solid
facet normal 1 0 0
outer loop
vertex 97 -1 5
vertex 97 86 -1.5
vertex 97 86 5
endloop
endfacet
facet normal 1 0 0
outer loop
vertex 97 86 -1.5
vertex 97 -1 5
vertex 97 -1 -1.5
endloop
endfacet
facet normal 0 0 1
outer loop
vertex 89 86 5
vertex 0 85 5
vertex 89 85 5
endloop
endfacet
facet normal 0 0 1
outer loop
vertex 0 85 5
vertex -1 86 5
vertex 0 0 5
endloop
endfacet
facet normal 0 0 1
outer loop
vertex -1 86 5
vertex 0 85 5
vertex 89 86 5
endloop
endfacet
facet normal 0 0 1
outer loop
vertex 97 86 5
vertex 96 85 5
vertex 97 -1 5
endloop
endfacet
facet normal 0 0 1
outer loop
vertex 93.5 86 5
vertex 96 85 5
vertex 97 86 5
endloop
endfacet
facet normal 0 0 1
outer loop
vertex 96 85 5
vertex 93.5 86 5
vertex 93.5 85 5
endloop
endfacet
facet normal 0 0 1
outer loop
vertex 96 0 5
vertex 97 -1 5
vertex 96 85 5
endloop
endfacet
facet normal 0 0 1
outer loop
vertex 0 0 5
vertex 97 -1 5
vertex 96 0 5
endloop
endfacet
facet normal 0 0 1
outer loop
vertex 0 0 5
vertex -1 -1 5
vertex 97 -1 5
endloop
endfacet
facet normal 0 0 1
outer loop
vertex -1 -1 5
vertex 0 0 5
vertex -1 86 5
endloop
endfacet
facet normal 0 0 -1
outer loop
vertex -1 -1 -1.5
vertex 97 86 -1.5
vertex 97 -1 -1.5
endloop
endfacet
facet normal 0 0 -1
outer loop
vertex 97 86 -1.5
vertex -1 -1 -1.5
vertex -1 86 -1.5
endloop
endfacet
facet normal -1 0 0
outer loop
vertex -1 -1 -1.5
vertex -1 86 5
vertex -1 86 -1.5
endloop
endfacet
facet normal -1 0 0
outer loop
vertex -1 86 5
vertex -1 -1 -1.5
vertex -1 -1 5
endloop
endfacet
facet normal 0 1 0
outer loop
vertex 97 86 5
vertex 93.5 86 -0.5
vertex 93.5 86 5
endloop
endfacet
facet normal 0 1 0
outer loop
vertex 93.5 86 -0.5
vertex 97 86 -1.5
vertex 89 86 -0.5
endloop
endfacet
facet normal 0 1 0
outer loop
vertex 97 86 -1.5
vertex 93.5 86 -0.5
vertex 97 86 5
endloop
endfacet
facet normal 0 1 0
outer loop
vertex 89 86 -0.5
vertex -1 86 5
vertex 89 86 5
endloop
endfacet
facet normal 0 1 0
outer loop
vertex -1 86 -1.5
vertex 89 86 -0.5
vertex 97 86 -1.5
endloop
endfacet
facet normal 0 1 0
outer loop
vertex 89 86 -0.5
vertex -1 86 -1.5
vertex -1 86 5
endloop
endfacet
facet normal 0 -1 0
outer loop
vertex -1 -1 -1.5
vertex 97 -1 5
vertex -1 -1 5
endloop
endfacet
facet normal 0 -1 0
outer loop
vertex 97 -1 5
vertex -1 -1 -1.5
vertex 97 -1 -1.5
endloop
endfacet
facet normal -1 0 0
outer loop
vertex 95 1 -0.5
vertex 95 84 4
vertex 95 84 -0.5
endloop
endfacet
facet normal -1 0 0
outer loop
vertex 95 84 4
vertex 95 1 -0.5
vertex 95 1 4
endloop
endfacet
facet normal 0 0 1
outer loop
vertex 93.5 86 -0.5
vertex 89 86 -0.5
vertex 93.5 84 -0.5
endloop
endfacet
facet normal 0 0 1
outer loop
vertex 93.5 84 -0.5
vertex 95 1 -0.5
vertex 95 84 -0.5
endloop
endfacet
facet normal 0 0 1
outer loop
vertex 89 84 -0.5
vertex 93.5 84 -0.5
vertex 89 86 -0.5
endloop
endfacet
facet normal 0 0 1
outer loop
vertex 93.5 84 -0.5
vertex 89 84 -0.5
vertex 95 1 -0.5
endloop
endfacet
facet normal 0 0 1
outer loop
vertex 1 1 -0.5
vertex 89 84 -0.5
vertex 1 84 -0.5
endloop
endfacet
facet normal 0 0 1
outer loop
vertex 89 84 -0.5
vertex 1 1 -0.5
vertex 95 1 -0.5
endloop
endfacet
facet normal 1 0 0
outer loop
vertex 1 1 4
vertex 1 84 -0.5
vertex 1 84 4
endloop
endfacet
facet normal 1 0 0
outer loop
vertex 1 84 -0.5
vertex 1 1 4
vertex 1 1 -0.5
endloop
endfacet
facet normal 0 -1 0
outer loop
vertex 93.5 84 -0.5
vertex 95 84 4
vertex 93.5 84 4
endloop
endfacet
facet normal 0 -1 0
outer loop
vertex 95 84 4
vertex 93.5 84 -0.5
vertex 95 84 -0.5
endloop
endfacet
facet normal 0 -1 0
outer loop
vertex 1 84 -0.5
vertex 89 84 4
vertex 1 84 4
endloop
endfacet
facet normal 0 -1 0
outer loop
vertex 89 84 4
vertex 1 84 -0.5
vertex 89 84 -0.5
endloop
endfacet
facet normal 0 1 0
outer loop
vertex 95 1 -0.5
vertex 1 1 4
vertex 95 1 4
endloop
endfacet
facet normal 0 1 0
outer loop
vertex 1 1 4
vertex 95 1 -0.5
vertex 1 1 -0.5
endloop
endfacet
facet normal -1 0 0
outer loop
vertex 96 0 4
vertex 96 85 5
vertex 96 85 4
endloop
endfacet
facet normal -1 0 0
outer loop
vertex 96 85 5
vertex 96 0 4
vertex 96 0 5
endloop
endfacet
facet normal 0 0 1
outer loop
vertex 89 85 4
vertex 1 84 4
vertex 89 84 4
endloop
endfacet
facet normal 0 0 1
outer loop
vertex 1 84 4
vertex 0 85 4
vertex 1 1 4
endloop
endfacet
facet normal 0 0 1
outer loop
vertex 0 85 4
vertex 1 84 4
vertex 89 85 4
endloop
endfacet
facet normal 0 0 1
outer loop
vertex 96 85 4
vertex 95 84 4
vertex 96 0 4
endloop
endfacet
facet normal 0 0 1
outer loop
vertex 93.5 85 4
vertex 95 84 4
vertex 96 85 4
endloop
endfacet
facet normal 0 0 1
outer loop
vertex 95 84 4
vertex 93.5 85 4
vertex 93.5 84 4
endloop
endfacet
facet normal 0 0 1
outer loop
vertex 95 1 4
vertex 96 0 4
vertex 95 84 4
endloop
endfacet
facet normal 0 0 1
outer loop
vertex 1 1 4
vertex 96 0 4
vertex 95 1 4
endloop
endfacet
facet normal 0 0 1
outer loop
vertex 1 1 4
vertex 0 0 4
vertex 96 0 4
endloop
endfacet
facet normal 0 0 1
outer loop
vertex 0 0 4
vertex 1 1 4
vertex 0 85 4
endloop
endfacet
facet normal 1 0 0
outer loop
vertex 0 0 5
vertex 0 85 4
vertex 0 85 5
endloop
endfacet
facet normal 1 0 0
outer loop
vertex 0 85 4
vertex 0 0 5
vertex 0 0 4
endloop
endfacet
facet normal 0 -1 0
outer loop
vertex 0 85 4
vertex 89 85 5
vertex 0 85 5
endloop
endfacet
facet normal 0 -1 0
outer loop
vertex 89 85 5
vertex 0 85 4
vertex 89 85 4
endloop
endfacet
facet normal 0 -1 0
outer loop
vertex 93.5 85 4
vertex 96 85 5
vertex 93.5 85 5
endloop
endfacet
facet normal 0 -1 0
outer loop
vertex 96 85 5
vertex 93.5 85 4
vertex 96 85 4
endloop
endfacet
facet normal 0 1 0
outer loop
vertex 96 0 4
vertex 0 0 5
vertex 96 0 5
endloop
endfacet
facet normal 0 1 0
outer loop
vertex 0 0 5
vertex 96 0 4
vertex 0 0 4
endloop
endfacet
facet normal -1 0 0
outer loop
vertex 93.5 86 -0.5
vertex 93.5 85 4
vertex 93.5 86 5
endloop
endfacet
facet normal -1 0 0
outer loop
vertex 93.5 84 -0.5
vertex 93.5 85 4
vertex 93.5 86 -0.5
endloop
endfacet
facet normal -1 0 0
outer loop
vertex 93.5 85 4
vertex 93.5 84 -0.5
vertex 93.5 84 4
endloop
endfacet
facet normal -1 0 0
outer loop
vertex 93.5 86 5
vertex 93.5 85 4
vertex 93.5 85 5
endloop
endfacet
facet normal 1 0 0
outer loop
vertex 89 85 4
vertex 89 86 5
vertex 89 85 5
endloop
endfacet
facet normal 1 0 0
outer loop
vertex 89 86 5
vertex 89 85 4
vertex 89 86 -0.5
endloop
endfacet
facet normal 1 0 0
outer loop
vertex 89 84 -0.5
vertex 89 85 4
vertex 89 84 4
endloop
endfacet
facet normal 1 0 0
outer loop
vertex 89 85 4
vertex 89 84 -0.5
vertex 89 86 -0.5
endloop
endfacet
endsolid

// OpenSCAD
// 1cm to 1foot scale model of the IBM Q System One Quantum Computer

// Andy Stanford-Clark
// andysc@uk.ibm.com / @andysc
// Feb '19


// v4.5 is a tidy-up for publication
// v4 is the redesigned glass idea for the base and lid
// v3 adds the deltas for the exploded view



// print list...

// 1. base 
// 2. base_lid 
// 3. back_box  * print with raft *
// 4. top_box * print with 1mm brim *
//    (then trim off all *except* the hole where the diffuser goes, as we need the lip to sit the diffuser on)
// 5. top_box_lid (inverted) 
// 6. lid (inverted)
// 7. lid_lower (inverted)
// 8. lid plinth (inverted for smoothness)

// 9. reflector in white (inverted)
// 10. reflector_strip in white

// 11. diffuser in clear filament (inverted) 

// cryostat needs to be a 25mm x 44mm silver tube (I used chrome-plated wardrobe rail)

// glass walls in 1mm acrylic
// front and back: 92 x 81 mm
// left and right: 85 x 81 mm 

// --------------------------------------------------------------------------------
// these should be the only bits you need to change (down to next dashed line)

// which bits to print?
// set each of these true in turn, and all the others false, to make each component


base = true;
base_lid = false;
back_box = false;
top_box = false;
top_box_lid = false;

// translucent
diffuser = false;

// white
reflector = false;
reflector_strip = false;

lid = false;
lid_lower = false; // the "lid" of the lid, if you like!
lid_plinth = false; // the thin plate on the very very top of the system


// --------------------------------------------------------------------------------
// optional elements for display purposes

cryostat = false; // we're not going to print this - it's just for display

// master control for walls
walls = false;
// selectively remove some of the walls
left_wall=true;
right_wall=false;
front_wall=false;
back_wall=true;


explode = 0; // set to 1 to explode the view, 0 normally

// --------------------------------------


wiring = true; // put in the cut-outs for a micro-USB cable
// how much extra height do we need on the base to allow for the cable?
extra_base = 1.5;


d = 3;
d1 = explode * d;     // base lid
d2 = explode * d*2; // back box
d3 = explode * d*5; // top box
d4 = explode * d*6.2; // lid lower
d5 = explode * d*7; // lid
d6 = explode * d*7.5; // lid plinth
d7 = explode * d*3; // diffuser 
d8 = explode * d*6; // top box lid
d9 = explode * d*2; // walls
d10 = explode * d*2; // cryostat


black = "white"; 
//black = "black";
white = "red";
//white = "white";

// going with a scale of 1cm to 1ft, so as it's 9ft wide, it's 90mm wide
// this is the INSIDE measurement - the flange for the glass is outside this
width = 96; // increased width for full-size pi compatibility
height = 90;
depth = 85;



mink_radius = 3;

// things that fit inside each other (e.g. diffuser inside top box)
// i.e. 0.5 mm total if you allow this each side (i.e. 2*)
tolerance = 0.25;

base_height = 6;
// make the back box a little bit lower just to allow for joint tolerances and stuff
back_box_height = 65 - 1; // this should be 65
back_box_depth = 37;   

top_box_height = 10;
// how far inset is the top box?
inside_gap = 3;

cryostat_height = 43;
cryostat_diameter = 25;

lid_height = 5;
// size of hole for wire in top box
wire_hole = 5;

// how thick to make the internal box walls£
box_walls = 1.0;

// how thick is the half inch thick plate glass?
glass_thickness = 1;

// how thin to make the little outside lip of the base?
edge_delta = 0.5;

// display cutout
display_height = 40; 
display_width = 70;
 
// here we go....  

back_box_width = width - 2*inside_gap;

mount_outer = 2;
mount_outer_base = 5; // wider base of mount for better printablility
mount_inner = 1.1; // 2mm for 3M screws
mount_height = 5;

color(black) {
    
// base
if (base) {
    difference() {
        translate([-glass_thickness, -glass_thickness, -extra_base])
            cube([width + 2*glass_thickness, depth + 2*glass_thickness, 
            base_height-1+extra_base]);
        // hollow out the insides
        translate([1, 1,-extra_base+box_walls])
            cube([width - 2, depth - 2, base_height-box_walls-1+extra_base]);
        // make a lip 1mm down for the lid to rest on
        translate([0, 0, base_height-1-1])
            cube([width, depth, 1]);
        
        // make the hole for the cable to come in
        if (wiring)
            translate([width - 7, depth -1, box_walls-extra_base])
                #cube([4.5,1+glass_thickness,base_height-box_walls-1+extra_base]);
        
    }  
}


// base lid
if (base_lid) {
        difference() {
            union() {
                // lid panel
                translate([0,0,base_height-1-1 + d1])
                    cube([width-2*tolerance, depth-2*tolerance, 2]);
        
                // make a stub for the back box to sit over
                translate([inside_gap+mink_radius, inside_gap + (25+15) + mink_radius, base_height])
                // 1.5 * tolerance cos that's half of 3
                   translate([box_walls+1.5*tolerance, box_walls+1.5*tolerance, 0])
                        difference() {
                            minkowski() {
                                // make it 3*tolerance for a bit of extra wiggle room
                                cube([back_box_width-2*mink_radius - 2*box_walls - 3*tolerance, 
                                    back_box_depth-2*mink_radius - 2*box_walls - 3*tolerance, 
                                    2]);
                                // where '2' is the height of the stub
                                cylinder(r=mink_radius, h=0.0001, $fn=100);
                            }
                            // hollow out the inside
                            translate([box_walls, box_walls, 0])
                                minkowski() {
                                    cube([back_box_width-2*mink_radius - 2*box_walls - 2*tolerance - 2*box_walls, 
                                        back_box_depth-2*mink_radius - 2*box_walls - 2*tolerance - 2*box_walls, 
                                        2]);
                                    // where '2' is the height of the stub
                                    cylinder(r=mink_radius, h=0.0001, $fn=100);
                                }
                       } // difference
                   } // union
                   
        // make the hole for a cable to come in
        if (wiring) {
            // hole right through the base for micro USB plug to go through
            translate([inside_gap+mink_radius + back_box_width - 18, 
                        inside_gap + (25+15) + mink_radius + back_box_depth - 15,
                        0]) 
            hull() {
                translate([0,-13,0]) {
                    cylinder(d=15, h=base_height, $fn=100);
                }
                cylinder(d=15, h=base_height, $fn=100);
            }
 
        } // wiring
        
    }  // difference
}
    

// back box
if (back_box) {

  translate([inside_gap+mink_radius, inside_gap + 25+15 + mink_radius, base_height + d2]) {
         
    difference() {
        minkowski() {
            cube([back_box_width-2*mink_radius, back_box_depth-2*mink_radius, back_box_height]);
            cylinder(r=mink_radius, h=0.0001, $fn=100);
        }
        translate([box_walls, box_walls, 0])
            minkowski() {
                cube([back_box_width-2*mink_radius - 2*box_walls, 
                    back_box_depth-2*mink_radius - 2*box_walls, 
                    back_box_height+0.1]);
                cylinder(r=mink_radius, h=0.0001, $fn=100);
            }
        // cut-out for display
        translate([width/2-inside_gap-mink_radius, 30, 30]) {
            cube([display_width,10,display_height], true);
        }
    }
    
    // add a little lip for the top box to register onto
    translate([box_walls,back_box_depth - 2*mink_radius - wire_hole - box_walls,
        back_box_height - 5])
        difference() {    
            minkowski() {
                cube([width - 2*inside_gap - 2*mink_radius - 2*box_walls, 
                        wire_hole,
                    box_walls + 5]);
                cylinder(r=mink_radius, h=0.0001, $fn=100);
            }
            // take out the "inside"
                translate([box_walls,-box_walls,0])
                minkowski() {
                    cube([width - 2*inside_gap - 2*mink_radius - 2* 2*box_walls, 
                            wire_hole,
                        box_walls + 5]);
                    cylinder(r=mink_radius, h=0.0001, $fn=100);
                }
        // don't cut out a block the size of the minkowski radius added on top and bottom, 
        // so the hole is actually wire_holes mm across    
        translate([-mink_radius,-mink_radius,0])
            cube([width - 2*inside_gap - 0*2*mink_radius - 2*box_walls, 
            2*mink_radius + tolerance, box_walls + 5+0.1]);
        }
    }
     translate([20,back_box_depth+9, 12]) {
         translate([0,0,0]) {
             rotate([90,0,0]) {
                 difference() {
                    cylinder(  mount_height,   mount_outer, mount_outer_base,true);
                     cylinder(  mount_height,   mount_inner, mount_inner,true);
                }
             }
         }
         translate([59,0,0]) {
             rotate([90,0,0]) {
                 difference() {
                    cylinder(  mount_height,   mount_outer, mount_outer_base,true);
                     cylinder(  mount_height,   mount_inner, mount_inner,true);
                }
             }
         }
         translate([0,0,49]) {
             rotate([90,0,0]) {
                 difference() {
                    cylinder(  mount_height,   mount_outer, mount_outer_base,true);
                     cylinder(  mount_height,   mount_inner, mount_inner,true);
                }
             }
         }
         translate([59,0,49]) {
             rotate([90,0,0]) {
                 difference() {
                    cylinder(  mount_height,   mount_outer, mount_outer_base,true);
                     cylinder(  mount_height,   mount_inner, mount_inner,true);
                }
             }
         }
     }
}

// top box
if (top_box) {
translate([inside_gap+mink_radius, inside_gap + mink_radius, base_height + back_box_height + d3])
    difference() {
        minkowski() {
            cube([width - 2*inside_gap - 2*mink_radius, 77 - 2*mink_radius,              top_box_height - box_walls]);
            cylinder(r=mink_radius, h=0.0001, $fn=100);
        }
        // hollow out the inside
        translate([box_walls, box_walls, box_walls]) {
            minkowski() {
                cube([width - 2*inside_gap - 2*mink_radius - 2*box_walls, 
                        77 - 2*mink_radius - 2*box_walls,
                    top_box_height+0.1]);
                cylinder(r=mink_radius, h=0.0001, $fn=100);
            }
            
            // hole for the diffuser
            translate([0,0,-box_walls])
                minkowski() {
                    cube([width - 2*inside_gap - 2*mink_radius - 2*box_walls, 
                            5/8* 77 - 2*mink_radius - 2*box_walls,
                        top_box_height+0.1]);
                    cylinder(r=mink_radius, h=0.0001, $fn=100);
                }
             
            // a hole for the wires
            translate([0,77 - 2*mink_radius - 2*box_walls - wire_hole,-box_walls])         
                difference() {    
                    minkowski() {
                        cube([width - 2*inside_gap - 2*mink_radius - 2*box_walls, 
                                wire_hole,
                            box_walls+0.1]);
                        cylinder(r=mink_radius, h=0.0001, $fn=100);
                    }
                    // leave a block the size of the minkowski radius added on top and bottom, 
                    // so the hole is actually wire_holes mm across    
                    translate([-mink_radius,-mink_radius,0])
                        cube([width - 2*inside_gap - 2*box_walls, 
                        2*mink_radius, box_walls]);
            }
        }
    }
}


if (top_box_lid)
    translate([inside_gap+mink_radius, inside_gap + mink_radius, base_height + back_box_height+top_box_height - box_walls + d8]) {
         minkowski() {
            cube([width - 2*inside_gap - 2*mink_radius, 77 - 2*mink_radius,              box_walls]);
            cylinder(r=mink_radius, h=0.0001, $fn=100);
        }      
        translate([box_walls+tolerance, box_walls+tolerance, -box_walls/2]) {
        minkowski() {
            cube([width - 2*inside_gap - 2*mink_radius - 2*box_walls - 2*tolerance, 
                    77 - 2*mink_radius - 2*box_walls - 2*tolerance,
                box_walls/2]);
            cylinder(r=mink_radius, h=0.0001, $fn=100);
        }   
    }
}


// lid
if (lid) {
    
    translate([0,0, height - lid_height + 1 + d5]) 
    
    difference() {
        translate([-glass_thickness, -glass_thickness, 0])
            cube([width + 2*glass_thickness, depth + 2*glass_thickness, lid_height-1]);
        // remove the insides
        translate([1, 1, 0])
            cube([width - 2, depth - 2, lid_height - 1 - box_walls]);
        // make a lip 1mm down for the lid to rest on
        translate([0, 0, 0])
            cube([width, depth, 1]);
    }
}


// lid lower
if (lid_lower) {
    translate([tolerance,tolerance,height - lid_height + d4]) 
        cube([width - 2*tolerance, depth - 2*tolerance, 1 + 1]);
}


// lid plinth
// the thin plate on top of the lid (which is hard to print in place)
if (lid_plinth)
    translate([0,0,height - lid_height + d6]) 
       translate([inside_gap/2, inside_gap/2, lid_height])
            cube([width - inside_gap, depth - inside_gap, 1]);
    

} // end of black



color(white) {
    // reflector
    if (reflector)
        translate([inside_gap+ mink_radius, 
                inside_gap, 
                base_height + back_box_height + top_box_height - box_walls - box_walls/2+0*15]) {
         
            translate([box_walls+tolerance, box_walls+tolerance, -0.5]) {
                          
                cube([width - 2*inside_gap - 2*box_walls - 2*tolerance - mink_radius*2, 
                        77 - 2*box_walls - 2*tolerance -5,
                    0.5]);
                
                difference() {
                               
                translate([0,0,- (top_box_height - box_walls/2 - 2*box_walls) + box_walls/2])
                    cube([width - 2*inside_gap - 2*box_walls - 2*tolerance - mink_radius*2,
                           5.5/8* 77 - 2*mink_radius - 2*box_walls - 2*tolerance,
                            top_box_height - box_walls/2 - 2*box_walls - box_walls/2]);
                               
                translate([0.5, 0, -(top_box_height - box_walls/2 - 2*box_walls)])
                  rotate([-7,0,180])
                    translate([-(width - 2*inside_gap - 2*box_walls - 2*tolerance - mink_radius*2),
                            -(5.5/8* 77 - 2*mink_radius - 2*box_walls - 2*tolerance)-0.5,-6-0.3])
                       cube([width - 2*inside_gap - 2*box_walls - 2*tolerance - mink_radius*2 + 1,
                           5.5/8* 77 - 2*mink_radius - 2*box_walls - 2*tolerance + 1,
                            top_box_height - box_walls/2 - 2*box_walls +1]);
                }
                    
        }
    }


    // reflector strip
    // small rectangle of white for the bottom of the top_box
    if (reflector_strip) 
       translate([inside_gap+ mink_radius, inside_gap + 0*mink_radius, base_height + back_box_height+0*top_box_height - box_walls+5]) 
            translate([0, 5/8* 77 - 0*2*mink_radius - 2*box_walls, 0]) {
         
            translate([box_walls+tolerance, box_walls+tolerance, -0.5]) {
     
                cube([width - 2*inside_gap - 2*box_walls - 2*tolerance - mink_radius*2, 
                        3/8* 77 - 2*box_walls - 2*tolerance -3 ,
                    0.5]);
                    
        }
    }

}


 // diffuser
 if (diffuser) {
    color(white) {
    difference() {
        
        translate([inside_gap+mink_radius+box_walls+tolerance, 
                inside_gap + mink_radius + box_walls+tolerance, 
                base_height + back_box_height + d7]) {
            minkowski() {
            cube([width - 2*inside_gap - 2*mink_radius - 2*box_walls - 2*tolerance, 
                    5/8* 77 - 2*mink_radius - 2*box_walls - 2*tolerance,
                    box_walls*1 + 0*1.5]);
                // add 1.5mm to see if it diffuses better
             cylinder(r=mink_radius, h=0.0001, $fn=100);
            }
        }
        // make a little hole for the cryostat to sit in
        translate([width/2, inside_gap + 7.5 + cryostat_diameter/2, 
            base_height + back_box_height + d7])
            cylinder(d=cryostat_diameter+ 2*tolerance, h=box_walls/2, $fn=200);
    }  
    // make a little mound for the chrome tube to sit over
    translate([width/2, inside_gap + 7.5 + cryostat_diameter/2, 
            base_height + back_box_height - 5 + box_walls + d7])
            cylinder(d=cryostat_diameter - 1 - 2*tolerance, h=5, $fn=200);
            // where "1" is 2 x the wall thickness of the chrome tube
            // and where "5" (in the translate and the cylinder) are the height of the mound
  }
}

    

// cryostat - this is just for show
if (cryostat) 
    color("white")
        translate([width/2, inside_gap + 7.5 + cryostat_diameter/2, 
            base_height + back_box_height - cryostat_height + d10])
            cylinder(d=cryostat_diameter, h=cryostat_height, $fn=200);


// walls - just for show
if (walls) 
    translate([0,0,d9])
    color("blue") {
        echo("front/back", width + 2*glass_thickness, height-base_height - lid_height + 2);
        echo("left/right", depth, height-base_height - lid_height + 2);
        
        // front
        if (front_wall)
        translate([-glass_thickness, -glass_thickness - d9, base_height - 1])
            #cube([width + 2*glass_thickness, glass_thickness, 
                height-base_height - lid_height + 2]);
        // back
        if (back_wall)
        translate([-glass_thickness, depth + d9, base_height - 1])
            #cube([width + 2*glass_thickness, glass_thickness, 
                height-base_height - lid_height + 2]);
        // left
        if (left_wall)
        translate([-glass_thickness - d9, 0, base_height-1])
            #cube([glass_thickness, depth, 
                height-base_height - lid_height + 2]);
        // right
        if (right_wall)
        translate([width + d9, 0, base_height-1])
            #cube([glass_thickness, depth, 
                height-base_height - lid_height + 2]);
            
    }

// END
